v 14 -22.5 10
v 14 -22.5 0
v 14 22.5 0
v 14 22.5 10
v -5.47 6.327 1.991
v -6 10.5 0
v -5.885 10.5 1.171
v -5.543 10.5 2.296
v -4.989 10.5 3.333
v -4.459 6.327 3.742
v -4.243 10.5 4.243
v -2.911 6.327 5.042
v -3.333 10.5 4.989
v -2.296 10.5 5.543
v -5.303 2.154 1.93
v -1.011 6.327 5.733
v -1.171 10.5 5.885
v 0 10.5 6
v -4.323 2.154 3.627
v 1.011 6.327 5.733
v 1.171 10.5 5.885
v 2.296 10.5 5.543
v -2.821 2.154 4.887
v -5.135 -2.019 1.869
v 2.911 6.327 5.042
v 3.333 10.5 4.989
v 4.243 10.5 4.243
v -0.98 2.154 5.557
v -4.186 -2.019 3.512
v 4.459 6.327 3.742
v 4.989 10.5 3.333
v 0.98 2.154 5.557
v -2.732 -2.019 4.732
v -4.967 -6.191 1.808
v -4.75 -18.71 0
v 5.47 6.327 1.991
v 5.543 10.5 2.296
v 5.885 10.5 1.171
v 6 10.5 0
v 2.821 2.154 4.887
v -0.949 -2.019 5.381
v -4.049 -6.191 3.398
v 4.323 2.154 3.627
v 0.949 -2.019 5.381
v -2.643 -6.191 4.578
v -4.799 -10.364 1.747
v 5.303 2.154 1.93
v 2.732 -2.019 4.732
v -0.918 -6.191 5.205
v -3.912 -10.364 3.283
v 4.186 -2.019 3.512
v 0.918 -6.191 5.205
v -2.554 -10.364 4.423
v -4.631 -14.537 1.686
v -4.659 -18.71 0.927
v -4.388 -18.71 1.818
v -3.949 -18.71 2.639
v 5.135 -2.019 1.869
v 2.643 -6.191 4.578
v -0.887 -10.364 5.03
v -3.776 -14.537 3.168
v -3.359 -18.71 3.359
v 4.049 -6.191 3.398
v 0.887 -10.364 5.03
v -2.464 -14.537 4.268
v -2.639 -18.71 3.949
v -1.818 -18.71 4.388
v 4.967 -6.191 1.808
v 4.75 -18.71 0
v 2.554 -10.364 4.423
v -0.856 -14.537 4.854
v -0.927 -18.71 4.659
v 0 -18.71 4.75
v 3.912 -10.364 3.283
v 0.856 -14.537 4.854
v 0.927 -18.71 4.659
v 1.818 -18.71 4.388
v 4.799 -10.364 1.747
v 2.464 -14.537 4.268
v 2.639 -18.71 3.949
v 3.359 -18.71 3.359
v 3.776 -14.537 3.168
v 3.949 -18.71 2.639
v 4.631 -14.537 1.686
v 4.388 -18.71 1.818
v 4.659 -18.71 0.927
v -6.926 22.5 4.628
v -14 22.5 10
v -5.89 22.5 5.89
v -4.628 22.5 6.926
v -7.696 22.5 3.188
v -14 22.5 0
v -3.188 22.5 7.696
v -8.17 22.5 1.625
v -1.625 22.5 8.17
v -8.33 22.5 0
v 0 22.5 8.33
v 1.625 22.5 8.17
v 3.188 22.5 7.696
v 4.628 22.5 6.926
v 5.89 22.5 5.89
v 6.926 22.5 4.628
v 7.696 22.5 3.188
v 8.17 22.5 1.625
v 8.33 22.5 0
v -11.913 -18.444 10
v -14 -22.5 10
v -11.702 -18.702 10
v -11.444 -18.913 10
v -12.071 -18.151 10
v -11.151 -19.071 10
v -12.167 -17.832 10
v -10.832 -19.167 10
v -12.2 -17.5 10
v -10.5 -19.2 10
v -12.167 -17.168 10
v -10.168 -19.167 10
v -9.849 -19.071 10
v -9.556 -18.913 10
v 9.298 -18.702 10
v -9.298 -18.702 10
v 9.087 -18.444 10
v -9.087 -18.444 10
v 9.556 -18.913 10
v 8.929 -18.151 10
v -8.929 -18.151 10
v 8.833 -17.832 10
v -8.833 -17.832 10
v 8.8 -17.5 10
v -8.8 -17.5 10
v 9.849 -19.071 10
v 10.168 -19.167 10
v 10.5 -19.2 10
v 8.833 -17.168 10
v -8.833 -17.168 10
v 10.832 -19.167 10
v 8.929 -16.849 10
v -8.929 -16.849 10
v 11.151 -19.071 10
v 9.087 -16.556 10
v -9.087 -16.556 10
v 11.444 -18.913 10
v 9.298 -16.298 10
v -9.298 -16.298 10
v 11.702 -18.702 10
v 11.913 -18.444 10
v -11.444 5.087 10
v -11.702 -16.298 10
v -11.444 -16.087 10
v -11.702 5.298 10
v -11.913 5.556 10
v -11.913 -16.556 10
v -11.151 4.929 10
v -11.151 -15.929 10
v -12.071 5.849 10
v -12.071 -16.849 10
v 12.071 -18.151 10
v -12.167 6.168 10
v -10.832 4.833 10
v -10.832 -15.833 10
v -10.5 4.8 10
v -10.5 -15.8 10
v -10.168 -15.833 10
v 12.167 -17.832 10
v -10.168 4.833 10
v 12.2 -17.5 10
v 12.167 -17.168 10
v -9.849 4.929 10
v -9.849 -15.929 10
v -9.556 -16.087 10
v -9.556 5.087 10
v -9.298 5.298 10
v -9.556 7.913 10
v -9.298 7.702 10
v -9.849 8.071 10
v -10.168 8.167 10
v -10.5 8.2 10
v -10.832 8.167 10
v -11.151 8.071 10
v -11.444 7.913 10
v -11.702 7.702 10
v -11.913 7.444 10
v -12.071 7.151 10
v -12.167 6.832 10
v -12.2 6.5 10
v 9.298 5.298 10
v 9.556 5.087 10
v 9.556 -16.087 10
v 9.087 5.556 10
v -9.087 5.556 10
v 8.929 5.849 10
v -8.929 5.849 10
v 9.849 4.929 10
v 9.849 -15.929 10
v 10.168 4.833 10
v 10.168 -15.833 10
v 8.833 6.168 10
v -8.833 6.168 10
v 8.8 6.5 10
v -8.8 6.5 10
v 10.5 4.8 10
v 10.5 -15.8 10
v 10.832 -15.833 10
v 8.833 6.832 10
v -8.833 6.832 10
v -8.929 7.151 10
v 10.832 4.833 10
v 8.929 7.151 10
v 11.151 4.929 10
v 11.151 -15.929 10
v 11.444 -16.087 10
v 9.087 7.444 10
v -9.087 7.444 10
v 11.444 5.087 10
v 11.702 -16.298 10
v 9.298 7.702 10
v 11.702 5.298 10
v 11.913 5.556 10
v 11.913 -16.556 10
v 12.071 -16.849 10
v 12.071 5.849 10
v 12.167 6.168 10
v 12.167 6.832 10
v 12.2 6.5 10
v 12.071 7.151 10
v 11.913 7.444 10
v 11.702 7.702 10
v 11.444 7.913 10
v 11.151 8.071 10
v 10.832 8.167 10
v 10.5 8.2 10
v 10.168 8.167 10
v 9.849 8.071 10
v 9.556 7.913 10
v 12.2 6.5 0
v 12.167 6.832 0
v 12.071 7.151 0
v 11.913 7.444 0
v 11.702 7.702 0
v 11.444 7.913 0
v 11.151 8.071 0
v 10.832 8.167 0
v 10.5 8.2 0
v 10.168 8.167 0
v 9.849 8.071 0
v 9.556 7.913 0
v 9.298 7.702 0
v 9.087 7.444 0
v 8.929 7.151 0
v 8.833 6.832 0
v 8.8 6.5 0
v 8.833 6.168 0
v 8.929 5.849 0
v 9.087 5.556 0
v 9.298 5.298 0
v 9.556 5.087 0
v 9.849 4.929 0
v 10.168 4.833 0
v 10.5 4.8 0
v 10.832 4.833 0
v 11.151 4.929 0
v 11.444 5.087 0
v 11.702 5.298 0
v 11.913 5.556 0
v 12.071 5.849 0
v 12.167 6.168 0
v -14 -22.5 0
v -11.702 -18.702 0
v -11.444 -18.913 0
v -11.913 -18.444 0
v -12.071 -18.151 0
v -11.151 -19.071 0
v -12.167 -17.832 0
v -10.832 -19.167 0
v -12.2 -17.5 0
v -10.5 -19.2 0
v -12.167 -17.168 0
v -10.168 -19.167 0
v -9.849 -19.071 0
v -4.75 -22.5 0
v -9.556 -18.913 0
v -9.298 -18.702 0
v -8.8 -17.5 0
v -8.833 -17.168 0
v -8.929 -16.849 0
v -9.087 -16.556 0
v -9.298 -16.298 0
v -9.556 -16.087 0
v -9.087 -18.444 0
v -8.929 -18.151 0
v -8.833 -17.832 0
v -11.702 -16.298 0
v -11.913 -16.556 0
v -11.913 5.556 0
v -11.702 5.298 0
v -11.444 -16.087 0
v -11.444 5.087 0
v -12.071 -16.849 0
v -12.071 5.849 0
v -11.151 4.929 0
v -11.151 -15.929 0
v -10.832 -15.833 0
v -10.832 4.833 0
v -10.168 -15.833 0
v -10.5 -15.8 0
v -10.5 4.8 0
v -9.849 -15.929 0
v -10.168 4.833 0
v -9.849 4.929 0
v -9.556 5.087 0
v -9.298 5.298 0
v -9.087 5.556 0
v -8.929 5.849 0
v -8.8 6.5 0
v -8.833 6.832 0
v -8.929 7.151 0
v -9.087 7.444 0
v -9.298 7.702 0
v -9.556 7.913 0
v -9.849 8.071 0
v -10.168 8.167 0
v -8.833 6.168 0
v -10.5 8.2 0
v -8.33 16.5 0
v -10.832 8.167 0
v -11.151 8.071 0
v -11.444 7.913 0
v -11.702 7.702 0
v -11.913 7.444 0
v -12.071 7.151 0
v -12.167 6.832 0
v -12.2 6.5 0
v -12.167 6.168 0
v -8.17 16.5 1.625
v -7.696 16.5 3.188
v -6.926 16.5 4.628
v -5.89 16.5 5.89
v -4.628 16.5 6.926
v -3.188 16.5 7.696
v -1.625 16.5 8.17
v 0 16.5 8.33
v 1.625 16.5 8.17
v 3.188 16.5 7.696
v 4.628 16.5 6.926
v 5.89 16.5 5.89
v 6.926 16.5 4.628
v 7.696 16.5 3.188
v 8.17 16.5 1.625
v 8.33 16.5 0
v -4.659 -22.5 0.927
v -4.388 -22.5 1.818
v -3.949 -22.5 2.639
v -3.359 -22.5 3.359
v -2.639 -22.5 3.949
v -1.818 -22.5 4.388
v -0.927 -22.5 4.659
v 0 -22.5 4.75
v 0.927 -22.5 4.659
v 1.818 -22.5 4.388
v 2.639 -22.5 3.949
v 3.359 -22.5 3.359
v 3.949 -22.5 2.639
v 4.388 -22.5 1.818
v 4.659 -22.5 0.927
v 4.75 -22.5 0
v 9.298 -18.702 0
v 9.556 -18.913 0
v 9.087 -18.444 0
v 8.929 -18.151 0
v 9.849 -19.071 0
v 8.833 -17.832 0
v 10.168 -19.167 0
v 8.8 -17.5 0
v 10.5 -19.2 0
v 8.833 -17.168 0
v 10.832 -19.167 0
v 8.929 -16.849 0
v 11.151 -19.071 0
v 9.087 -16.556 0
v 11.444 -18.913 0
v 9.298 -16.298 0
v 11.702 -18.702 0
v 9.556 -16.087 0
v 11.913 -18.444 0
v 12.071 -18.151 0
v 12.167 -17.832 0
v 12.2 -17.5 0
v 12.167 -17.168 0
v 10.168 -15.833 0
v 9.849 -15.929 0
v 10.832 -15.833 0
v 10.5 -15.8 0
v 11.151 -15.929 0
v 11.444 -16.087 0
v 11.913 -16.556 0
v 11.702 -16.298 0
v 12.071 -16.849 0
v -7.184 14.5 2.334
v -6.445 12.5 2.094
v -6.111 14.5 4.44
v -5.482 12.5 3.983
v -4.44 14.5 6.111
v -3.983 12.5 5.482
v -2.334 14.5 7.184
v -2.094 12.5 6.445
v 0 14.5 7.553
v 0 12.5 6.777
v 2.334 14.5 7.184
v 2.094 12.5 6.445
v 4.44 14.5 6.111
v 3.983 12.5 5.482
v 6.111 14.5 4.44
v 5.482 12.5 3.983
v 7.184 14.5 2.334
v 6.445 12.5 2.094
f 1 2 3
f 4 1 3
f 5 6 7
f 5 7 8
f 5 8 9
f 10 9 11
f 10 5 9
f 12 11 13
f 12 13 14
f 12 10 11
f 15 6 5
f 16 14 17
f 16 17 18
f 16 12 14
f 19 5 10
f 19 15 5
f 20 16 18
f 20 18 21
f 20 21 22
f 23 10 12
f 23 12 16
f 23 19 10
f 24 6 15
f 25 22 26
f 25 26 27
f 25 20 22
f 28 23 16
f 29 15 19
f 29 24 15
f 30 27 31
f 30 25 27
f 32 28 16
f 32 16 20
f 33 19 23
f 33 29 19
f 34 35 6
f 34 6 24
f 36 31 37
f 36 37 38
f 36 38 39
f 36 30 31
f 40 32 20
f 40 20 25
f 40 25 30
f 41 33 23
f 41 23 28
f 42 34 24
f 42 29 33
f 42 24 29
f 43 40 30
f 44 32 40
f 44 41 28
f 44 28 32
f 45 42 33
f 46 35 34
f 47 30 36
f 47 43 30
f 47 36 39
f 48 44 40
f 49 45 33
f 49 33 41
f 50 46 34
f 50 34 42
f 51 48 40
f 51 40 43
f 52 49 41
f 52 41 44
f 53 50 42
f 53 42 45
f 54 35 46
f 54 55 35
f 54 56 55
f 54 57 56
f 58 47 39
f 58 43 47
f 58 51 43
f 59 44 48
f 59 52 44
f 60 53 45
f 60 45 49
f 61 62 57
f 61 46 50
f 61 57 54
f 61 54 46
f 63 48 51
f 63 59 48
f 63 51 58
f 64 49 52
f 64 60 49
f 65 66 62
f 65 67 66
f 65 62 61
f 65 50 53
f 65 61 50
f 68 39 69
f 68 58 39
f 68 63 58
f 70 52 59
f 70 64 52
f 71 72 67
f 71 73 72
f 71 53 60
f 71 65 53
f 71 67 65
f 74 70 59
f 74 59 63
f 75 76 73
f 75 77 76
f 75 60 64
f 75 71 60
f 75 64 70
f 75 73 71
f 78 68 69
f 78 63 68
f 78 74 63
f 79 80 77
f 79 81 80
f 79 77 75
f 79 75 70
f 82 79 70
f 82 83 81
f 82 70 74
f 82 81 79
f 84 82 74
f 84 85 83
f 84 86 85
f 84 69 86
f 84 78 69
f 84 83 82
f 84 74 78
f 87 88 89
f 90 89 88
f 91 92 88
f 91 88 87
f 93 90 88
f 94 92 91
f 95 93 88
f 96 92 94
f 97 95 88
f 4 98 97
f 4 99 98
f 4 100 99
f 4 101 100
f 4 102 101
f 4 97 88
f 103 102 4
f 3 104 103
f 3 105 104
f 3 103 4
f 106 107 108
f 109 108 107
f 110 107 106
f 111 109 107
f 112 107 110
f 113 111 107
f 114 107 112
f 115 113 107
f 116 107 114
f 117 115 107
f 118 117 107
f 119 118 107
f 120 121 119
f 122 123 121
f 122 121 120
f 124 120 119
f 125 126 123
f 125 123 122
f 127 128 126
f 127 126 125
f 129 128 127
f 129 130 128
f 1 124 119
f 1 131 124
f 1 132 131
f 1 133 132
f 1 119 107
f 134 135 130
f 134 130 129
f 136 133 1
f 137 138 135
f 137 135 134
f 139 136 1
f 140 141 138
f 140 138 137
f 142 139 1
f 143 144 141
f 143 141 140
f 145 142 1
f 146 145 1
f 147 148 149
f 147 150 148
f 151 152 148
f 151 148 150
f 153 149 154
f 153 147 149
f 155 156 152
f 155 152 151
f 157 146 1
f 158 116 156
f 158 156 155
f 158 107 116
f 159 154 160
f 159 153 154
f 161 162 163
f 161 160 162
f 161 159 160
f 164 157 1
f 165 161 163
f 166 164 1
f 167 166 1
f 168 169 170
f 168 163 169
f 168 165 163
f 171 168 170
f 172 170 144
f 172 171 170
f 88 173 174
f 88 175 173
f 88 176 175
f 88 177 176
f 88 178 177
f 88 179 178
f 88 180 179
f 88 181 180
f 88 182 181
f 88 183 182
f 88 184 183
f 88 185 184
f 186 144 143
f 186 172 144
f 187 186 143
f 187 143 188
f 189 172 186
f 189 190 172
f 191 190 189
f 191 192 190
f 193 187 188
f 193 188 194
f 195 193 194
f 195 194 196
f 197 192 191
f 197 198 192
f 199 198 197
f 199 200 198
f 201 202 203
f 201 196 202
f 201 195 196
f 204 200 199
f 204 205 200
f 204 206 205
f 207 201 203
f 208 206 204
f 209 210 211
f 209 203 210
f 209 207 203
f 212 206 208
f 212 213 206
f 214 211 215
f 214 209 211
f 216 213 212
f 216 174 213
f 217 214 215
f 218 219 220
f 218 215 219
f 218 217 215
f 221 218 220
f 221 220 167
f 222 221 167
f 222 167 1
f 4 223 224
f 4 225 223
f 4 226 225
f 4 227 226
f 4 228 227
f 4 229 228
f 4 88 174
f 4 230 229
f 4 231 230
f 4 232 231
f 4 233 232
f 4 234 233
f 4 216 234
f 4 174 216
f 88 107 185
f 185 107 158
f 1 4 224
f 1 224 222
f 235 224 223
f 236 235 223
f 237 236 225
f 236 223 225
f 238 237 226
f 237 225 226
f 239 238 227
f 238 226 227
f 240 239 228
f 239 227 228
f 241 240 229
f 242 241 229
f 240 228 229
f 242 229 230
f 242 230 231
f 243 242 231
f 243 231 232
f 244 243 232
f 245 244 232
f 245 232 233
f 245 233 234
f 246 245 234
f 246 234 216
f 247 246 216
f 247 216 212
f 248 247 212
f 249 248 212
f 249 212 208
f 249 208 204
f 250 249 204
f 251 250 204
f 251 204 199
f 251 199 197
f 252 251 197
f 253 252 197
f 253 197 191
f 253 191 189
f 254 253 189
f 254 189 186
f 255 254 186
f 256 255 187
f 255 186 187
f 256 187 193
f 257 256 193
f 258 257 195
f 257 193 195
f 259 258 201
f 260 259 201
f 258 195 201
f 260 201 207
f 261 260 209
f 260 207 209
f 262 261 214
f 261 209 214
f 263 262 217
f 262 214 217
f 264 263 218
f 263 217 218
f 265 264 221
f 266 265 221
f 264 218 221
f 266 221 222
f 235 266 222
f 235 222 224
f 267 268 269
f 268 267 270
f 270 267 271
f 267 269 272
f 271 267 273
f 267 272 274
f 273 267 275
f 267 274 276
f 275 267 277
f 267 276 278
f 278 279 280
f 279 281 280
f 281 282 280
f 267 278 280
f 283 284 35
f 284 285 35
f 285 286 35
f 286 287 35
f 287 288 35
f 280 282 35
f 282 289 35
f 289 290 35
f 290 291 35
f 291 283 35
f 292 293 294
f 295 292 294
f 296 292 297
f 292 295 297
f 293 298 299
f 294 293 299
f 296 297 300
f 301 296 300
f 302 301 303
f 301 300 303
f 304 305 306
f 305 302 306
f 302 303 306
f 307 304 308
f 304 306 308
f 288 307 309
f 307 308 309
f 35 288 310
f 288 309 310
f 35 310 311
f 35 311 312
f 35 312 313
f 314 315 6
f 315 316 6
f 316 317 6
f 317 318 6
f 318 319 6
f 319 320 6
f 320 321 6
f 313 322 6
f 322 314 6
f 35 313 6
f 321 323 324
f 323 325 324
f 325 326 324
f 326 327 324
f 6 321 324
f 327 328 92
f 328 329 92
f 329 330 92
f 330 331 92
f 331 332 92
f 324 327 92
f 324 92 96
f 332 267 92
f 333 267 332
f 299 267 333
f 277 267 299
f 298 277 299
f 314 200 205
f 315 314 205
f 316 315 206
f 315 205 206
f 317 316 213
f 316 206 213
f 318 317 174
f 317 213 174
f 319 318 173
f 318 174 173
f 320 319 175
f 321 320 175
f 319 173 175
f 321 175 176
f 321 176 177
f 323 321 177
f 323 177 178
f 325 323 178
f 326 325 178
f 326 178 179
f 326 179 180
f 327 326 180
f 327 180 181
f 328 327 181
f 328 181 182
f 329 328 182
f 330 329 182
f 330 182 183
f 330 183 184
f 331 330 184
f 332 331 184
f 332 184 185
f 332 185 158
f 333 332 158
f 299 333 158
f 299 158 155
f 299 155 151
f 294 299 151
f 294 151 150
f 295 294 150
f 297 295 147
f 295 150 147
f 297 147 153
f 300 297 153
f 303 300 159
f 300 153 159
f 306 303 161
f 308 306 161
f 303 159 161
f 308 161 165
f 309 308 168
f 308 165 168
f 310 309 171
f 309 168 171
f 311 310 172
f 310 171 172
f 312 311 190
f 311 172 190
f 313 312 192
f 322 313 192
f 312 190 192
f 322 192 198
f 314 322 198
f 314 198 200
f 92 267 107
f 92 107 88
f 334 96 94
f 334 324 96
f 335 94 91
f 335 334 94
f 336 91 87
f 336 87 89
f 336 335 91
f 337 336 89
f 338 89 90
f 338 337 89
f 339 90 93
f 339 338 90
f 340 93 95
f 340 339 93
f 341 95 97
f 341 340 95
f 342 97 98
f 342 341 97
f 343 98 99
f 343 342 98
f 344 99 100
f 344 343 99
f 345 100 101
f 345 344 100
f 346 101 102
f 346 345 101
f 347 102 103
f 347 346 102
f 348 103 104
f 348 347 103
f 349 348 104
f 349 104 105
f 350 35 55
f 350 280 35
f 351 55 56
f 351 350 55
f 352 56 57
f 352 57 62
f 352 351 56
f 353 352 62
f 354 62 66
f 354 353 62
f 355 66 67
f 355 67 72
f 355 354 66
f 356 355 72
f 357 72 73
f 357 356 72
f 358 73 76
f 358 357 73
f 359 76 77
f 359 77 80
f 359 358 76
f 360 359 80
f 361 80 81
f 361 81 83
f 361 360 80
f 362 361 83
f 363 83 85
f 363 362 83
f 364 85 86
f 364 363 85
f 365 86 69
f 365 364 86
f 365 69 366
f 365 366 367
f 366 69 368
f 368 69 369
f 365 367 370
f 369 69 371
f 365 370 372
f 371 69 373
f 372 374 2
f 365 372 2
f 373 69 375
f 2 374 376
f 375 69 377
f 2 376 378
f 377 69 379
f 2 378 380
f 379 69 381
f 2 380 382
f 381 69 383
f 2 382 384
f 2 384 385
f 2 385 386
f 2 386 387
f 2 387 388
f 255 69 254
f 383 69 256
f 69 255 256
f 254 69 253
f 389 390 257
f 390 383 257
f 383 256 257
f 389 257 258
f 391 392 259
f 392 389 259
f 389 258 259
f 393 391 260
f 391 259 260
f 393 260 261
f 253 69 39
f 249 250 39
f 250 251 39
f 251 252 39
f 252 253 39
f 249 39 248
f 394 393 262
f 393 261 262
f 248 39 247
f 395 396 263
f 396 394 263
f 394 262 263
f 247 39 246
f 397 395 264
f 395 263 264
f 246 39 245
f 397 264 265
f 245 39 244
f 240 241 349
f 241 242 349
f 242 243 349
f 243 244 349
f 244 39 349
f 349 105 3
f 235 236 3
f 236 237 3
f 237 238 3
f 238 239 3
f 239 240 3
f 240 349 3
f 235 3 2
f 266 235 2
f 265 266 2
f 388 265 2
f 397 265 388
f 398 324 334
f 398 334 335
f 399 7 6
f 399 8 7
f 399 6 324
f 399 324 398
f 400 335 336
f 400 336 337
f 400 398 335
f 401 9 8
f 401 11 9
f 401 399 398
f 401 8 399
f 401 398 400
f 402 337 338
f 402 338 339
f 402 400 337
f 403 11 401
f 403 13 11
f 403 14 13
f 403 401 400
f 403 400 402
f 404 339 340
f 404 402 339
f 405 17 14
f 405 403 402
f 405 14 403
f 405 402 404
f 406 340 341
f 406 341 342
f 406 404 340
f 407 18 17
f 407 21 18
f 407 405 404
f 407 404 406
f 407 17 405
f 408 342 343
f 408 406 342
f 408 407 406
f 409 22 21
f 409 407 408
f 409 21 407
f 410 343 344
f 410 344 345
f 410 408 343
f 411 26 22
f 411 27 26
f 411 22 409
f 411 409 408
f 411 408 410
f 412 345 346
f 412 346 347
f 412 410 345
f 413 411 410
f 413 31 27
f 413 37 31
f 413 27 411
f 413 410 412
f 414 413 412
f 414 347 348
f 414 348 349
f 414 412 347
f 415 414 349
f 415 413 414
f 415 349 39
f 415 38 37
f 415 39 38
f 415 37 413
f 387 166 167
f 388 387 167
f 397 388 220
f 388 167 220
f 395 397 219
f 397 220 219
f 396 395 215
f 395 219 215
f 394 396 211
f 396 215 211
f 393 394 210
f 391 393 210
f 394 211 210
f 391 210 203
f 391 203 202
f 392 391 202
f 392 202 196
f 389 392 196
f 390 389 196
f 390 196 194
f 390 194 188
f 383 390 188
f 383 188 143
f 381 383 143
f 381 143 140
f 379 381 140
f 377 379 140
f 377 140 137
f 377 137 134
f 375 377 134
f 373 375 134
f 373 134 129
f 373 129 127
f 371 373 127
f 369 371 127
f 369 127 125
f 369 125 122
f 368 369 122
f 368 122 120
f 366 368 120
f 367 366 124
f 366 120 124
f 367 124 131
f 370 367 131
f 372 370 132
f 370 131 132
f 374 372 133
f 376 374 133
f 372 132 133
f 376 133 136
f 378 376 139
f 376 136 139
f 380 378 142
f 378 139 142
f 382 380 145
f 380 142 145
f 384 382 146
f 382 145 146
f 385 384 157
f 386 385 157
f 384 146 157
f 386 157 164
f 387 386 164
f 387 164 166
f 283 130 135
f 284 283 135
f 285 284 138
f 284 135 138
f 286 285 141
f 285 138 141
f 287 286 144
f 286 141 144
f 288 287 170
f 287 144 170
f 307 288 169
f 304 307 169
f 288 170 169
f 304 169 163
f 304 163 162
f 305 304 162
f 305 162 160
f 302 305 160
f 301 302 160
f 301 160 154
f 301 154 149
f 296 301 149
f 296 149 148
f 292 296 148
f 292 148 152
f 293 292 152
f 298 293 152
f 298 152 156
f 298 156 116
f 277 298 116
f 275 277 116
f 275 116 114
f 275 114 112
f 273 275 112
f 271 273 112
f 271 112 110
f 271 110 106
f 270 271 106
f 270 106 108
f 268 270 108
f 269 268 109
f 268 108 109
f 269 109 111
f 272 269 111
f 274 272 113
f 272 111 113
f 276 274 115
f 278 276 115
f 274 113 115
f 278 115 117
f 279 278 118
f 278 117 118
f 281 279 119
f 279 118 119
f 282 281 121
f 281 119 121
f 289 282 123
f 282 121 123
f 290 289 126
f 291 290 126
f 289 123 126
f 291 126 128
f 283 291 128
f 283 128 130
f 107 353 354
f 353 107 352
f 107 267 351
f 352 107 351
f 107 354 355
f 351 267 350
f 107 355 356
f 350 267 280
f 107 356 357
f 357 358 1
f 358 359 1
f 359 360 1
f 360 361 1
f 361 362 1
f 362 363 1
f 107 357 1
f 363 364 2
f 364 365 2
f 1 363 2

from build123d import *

# Parameters (mm, degrees)
SKETCH4_W           = 28
SKETCH4_H           = 45
BOSS_EXTRUDE2_DEPTH = 10
SKETCH6_R           = 1.7
CUT_EXTRUDE1_DEPTH  = 29.324018077


with BuildPart() as part:
    # Sketch4 → Boss-Extrude2 (new body)
    with BuildSketch(Plane.XY):
        Rectangle(SKETCH4_W, SKETCH4_H)
    extrude(amount=BOSS_EXTRUDE2_DEPTH)

    # Sketch5 → Cut-Revolve1 (revolve, cut)
    with BuildSketch(Plane.XY):
        Polygon((0, 22.5), (8.33, 22.5), (8.33, 16.5), (6, 10.5), (4.75, -18.71), (4.75, -22.5), (0, -22.5), align=None)
    revolve(axis=Axis((0, 0, 0), (0, 1, 0)), mode=Mode.SUBTRACT)

    # Sketch6 → Cut-Extrude1 (cut, through all)
    with BuildSketch(Plane.XY.offset(10)):
        with Locations((-10.5, 6.5)):
            Circle(SKETCH6_R)
        with Locations((-10.5, -17.5)):
            Circle(SKETCH6_R)
        with Locations((10.5, 6.5)):
            Circle(SKETCH6_R)
        with Locations((10.5, -17.5)):
            Circle(SKETCH6_R)
    extrude(amount=-CUT_EXTRUDE1_DEPTH, mode=Mode.SUBTRACT)


solid = part.part
